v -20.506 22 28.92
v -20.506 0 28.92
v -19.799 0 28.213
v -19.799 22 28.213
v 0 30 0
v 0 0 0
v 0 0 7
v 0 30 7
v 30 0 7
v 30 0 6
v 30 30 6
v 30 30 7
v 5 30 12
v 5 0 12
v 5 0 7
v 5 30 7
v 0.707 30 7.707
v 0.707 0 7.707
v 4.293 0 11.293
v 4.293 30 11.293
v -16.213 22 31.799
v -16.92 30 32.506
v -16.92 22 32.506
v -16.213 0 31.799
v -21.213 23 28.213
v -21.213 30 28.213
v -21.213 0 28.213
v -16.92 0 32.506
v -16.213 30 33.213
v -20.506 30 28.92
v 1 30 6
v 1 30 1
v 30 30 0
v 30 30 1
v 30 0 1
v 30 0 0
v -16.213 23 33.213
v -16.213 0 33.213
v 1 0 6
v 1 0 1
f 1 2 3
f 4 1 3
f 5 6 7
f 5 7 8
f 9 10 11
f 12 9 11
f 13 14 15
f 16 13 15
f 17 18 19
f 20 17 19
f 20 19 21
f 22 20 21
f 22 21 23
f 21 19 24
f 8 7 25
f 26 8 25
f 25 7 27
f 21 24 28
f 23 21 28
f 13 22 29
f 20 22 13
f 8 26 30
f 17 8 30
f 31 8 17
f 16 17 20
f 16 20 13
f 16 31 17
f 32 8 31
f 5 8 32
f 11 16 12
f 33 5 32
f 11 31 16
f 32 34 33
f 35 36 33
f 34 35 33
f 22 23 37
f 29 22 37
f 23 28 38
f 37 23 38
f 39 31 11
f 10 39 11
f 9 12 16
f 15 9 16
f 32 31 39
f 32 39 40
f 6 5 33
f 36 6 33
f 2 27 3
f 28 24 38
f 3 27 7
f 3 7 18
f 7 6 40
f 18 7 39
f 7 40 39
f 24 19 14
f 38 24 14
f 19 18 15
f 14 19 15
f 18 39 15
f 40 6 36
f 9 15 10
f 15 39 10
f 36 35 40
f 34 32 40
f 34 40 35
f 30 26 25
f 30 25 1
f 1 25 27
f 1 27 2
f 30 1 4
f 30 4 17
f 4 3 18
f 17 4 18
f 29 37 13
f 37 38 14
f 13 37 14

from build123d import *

# Parameters (mm, degrees)
SKETCH1_W           = 30
SKETCH1_H           = 30
BOSS_EXTRUDE1_DEPTH = 7
SHELL1_T            = -1
SKETCH2_W           = 30
SKETCH2_H           = 7
BOSS_EXTRUDE2_DEPTH = 30
SKETCH3_W           = 30
SKETCH3_H           = 7
BOSS_EXTRUDE3_DEPTH = 30
SKETCH5_W           = 5
SKETCH5_H           = 23
BOSS_EXTRUDE4_DEPTH = 5
CUT_EXTRUDE6_DEPTH  = 23
SKETCH12_W          = 7.071067812
SKETCH12_H          = 23
BOSS_EXTRUDE6_DEPTH = 30
CUT_EXTRUDE7_DEPTH  = 22
CUT_EXTRUDE8_DEPTH  = 22
SHELL2_START        = 24
SHELL2_DEPTH        = 5
SHELL2_START_2      = 23
SHELL2_2_DEPTH      = 1
SHELL2_START_3      = 1
SHELL2_3_DEPTH      = 22
BOSS_EXTRUDE7_DEPTH = 1
BOSS_EXTRUDE8_DEPTH = 23
CUT_EXTRUDE10_DEPTH = 1
CUT_EXTRUDE11_DEPTH = 7
BOSS_EXTRUDE9_DEPTH = 7
CUT_EXTRUDE12_DEPTH = 7
SKETCH23_W          = 29
SKETCH23_H          = 5
CUT_EXTRUDE14_DEPTH = 7
CUT_EXTRUDE15_DEPTH = 7


# Read off the part's stored shape, not the designer's step: Shell2
with BuildPart() as part:
    # Sketch1 → Boss-Extrude1 (new body)
    with BuildSketch(Plane.XY):
        with Locations((15, 15)):
            Rectangle(SKETCH1_W, SKETCH1_H)
    extrude(amount=BOSS_EXTRUDE1_DEPTH)

    # Shell1
    shell1_openings = [part.faces().sort_by_distance(p)[0] for p in [
        (30, 15, 3.5),
        (15, 0, 3.5),
    ]]
    offset(amount=SHELL1_T, openings=shell1_openings, kind=Kind.INTERSECTION)

    # Sketch2 → Boss-Extrude2 (add)
    with BuildSketch(Plane.XY.offset(7)):
        with Locations((15, 26.5)):
            Rectangle(SKETCH2_W, SKETCH2_H)
    extrude(amount=BOSS_EXTRUDE2_DEPTH)

    # Sketch3 → Boss-Extrude3 (add)
    with BuildSketch(Plane.ZY):
        with Locations((22, 26.5)):
            Rectangle(SKETCH3_W, SKETCH3_H)
    extrude(amount=BOSS_EXTRUDE3_DEPTH)

    # Sketch5 → Boss-Extrude4 (add)
    with BuildSketch(Plane.XY.offset(7)):
        with Locations((2.5, 11.5)):
            Rectangle(SKETCH5_W, SKETCH5_H)
    extrude(amount=BOSS_EXTRUDE4_DEPTH)

    # Sketch6 → Cut-Extrude6 (cut)
    with BuildSketch(Plane.XZ):
        Polygon((0, 12), (5, 12), (0, 7), align=None)
    extrude(amount=-CUT_EXTRUDE6_DEPTH, mode=Mode.SUBTRACT)

    # Sketch12 → Boss-Extrude6 (add)
    with BuildSketch(Plane(origin=(-3.5, 0, 3.5), x_dir=(0.7071067811865475, 0, 0.7071067811865477), z_dir=(-0.7071067811865477, 0, 0.7071067811865475))):
        with Locations((8.485281374, 11.5)):
            Rectangle(SKETCH12_W, SKETCH12_H)
    extrude(amount=BOSS_EXTRUDE6_DEPTH)

    # Sketch13 → Cut-Extrude7 (cut)
    with BuildSketch(Plane.XZ):
        Polygon((-19.798989873, 28.213203436), (0.707106781, 7.707106781), (4.292893219, 11.292893219), (-16.213203436, 31.798989873), (-16.920310217, 32.506096654), (-20.506096654, 28.920310217), align=None)
    extrude(amount=-CUT_EXTRUDE7_DEPTH, mode=Mode.SUBTRACT)

    # Sketch4 → Cut-Extrude8 (cut)
    with BuildSketch(Plane.XZ.offset(-23)):
        Polygon((-30, 37), (0, 7), (-30, 7), align=None)
    extrude(amount=-CUT_EXTRUDE8_DEPTH, mode=Mode.SUBTRACT)

    # Shell2 outline → Shell2 (cut)
    with BuildSketch(Plane(origin=(0, 0, 0), x_dir=(1, 0, 0), z_dir=(0, 1, 0)).offset(SHELL2_START)):
        Polygon((29, -37), (29, -7), (1, -7), (1, -7.414213562), (-28.585786438, -37), align=None)
    extrude(amount=SHELL2_DEPTH, mode=Mode.SUBTRACT)

    # Shell2 2 outline → Shell2 2 (cut)
    with BuildSketch(Plane(origin=(0, 0, 0), x_dir=(1, 0, 0), z_dir=(0, 1, 0)).offset(SHELL2_START_2)):
        Polygon((4, -7), (1, -7), (1, -7.414213562), (-19.798989873, -28.213203435), (-16.213203436, -31.798989873), (4, -11.585786438), align=None)
    extrude(amount=SHELL2_2_DEPTH, mode=Mode.SUBTRACT)

    # Shell2 3 outline → Shell2 3 (cut)
    with BuildSketch(Plane(origin=(0, 0, 0), x_dir=(1, 0, 0), z_dir=(0, 1, 0)).offset(SHELL2_START_3)):
        Polygon((4, -9.585786438), (4, -7), (1.414213562, -7), align=None)
    extrude(amount=SHELL2_3_DEPTH, mode=Mode.SUBTRACT)

    # Sketch16 → Boss-Extrude7 (add)
    with BuildSketch(Plane(origin=(0, 23, 0), x_dir=(1, 0, 0), z_dir=(0, 1, 0))):
        Polygon((1.414213562, -7), (1, -7), (1, -7.414213562), (-19.798989873, -28.213203436), (-16.213203436, -31.798989873), (4, -11.585786438), (4, -9.585786438), align=None)
    extrude(amount=BOSS_EXTRUDE7_DEPTH)

    # Sketch18 → Boss-Extrude8 (add)
    with BuildSketch(Plane(origin=(0, 1, 0), x_dir=(1, 0, 0), z_dir=(0, 1, 0))):
        Polygon((4, -9.585786438), (4, -7), (1.414213562, -7), align=None)
    extrude(amount=BOSS_EXTRUDE8_DEPTH)

    # Sketch19 → Cut-Extrude10 (cut)
    with BuildSketch(Plane(origin=(30, 0, 0), x_dir=(0, 0, -1), z_dir=(1, 0, 0))):
        Polygon((-36, 29), (-37, 29), (-37, 24), (-36, 24), (-7, 24), (-7, 29), align=None)
    extrude(amount=-CUT_EXTRUDE10_DEPTH, mode=Mode.SUBTRACT)

    # Sketch17 → Cut-Extrude11 (cut)
    with BuildSketch(Plane(origin=(0, 30, 0), x_dir=(1, 0, 0), z_dir=(0, 1, 0))):
        Polygon((0, -7), (30, -7), (30, -37), (-30, -37), align=None)
    extrude(amount=-CUT_EXTRUDE11_DEPTH, mode=Mode.SUBTRACT)

    # Sketch21 → Boss-Extrude9 (add)
    with BuildSketch(Plane(origin=(0, 23, 0), x_dir=(1, 0, 0), z_dir=(0, 1, 0))):
        Polygon((5, -12), (5, -7), (0, -7), (-21.213203436, -28.213203436), (-16.213203436, -33.213203436), align=None)
    extrude(amount=BOSS_EXTRUDE9_DEPTH)

    # Sketch22 → Cut-Extrude12 (cut)
    with BuildSketch(Plane.XZ.offset(-22)):
        Polygon((-16.920310217, 32.506096654), (-20.506096654, 28.920310217), (0.707106781, 7.707106781), (4.292893219, 11.292893219), align=None)
    extrude(amount=-CUT_EXTRUDE12_DEPTH, mode=Mode.SUBTRACT)

    # Sketch23 → Cut-Extrude14 (cut)
    with BuildSketch(Plane(origin=(0, 30, 0), x_dir=(1, 0, 0), z_dir=(0, 1, 0))):
        with Locations((15.5, -3.5)):
            Rectangle(SKETCH23_W, SKETCH23_H)
    extrude(amount=-CUT_EXTRUDE14_DEPTH, mode=Mode.SUBTRACT)

    # Sketch24 → Cut-Extrude15 (cut)
    with BuildSketch(Plane.XZ.offset(-29)):
        Polygon((4.292893219, 11.292893219), (-16.920310217, 32.506096654), (-20.506096654, 28.920310217), (0.707106781, 7.707106781), align=None)
    extrude(amount=-CUT_EXTRUDE15_DEPTH, mode=Mode.SUBTRACT)


solid = part.part
